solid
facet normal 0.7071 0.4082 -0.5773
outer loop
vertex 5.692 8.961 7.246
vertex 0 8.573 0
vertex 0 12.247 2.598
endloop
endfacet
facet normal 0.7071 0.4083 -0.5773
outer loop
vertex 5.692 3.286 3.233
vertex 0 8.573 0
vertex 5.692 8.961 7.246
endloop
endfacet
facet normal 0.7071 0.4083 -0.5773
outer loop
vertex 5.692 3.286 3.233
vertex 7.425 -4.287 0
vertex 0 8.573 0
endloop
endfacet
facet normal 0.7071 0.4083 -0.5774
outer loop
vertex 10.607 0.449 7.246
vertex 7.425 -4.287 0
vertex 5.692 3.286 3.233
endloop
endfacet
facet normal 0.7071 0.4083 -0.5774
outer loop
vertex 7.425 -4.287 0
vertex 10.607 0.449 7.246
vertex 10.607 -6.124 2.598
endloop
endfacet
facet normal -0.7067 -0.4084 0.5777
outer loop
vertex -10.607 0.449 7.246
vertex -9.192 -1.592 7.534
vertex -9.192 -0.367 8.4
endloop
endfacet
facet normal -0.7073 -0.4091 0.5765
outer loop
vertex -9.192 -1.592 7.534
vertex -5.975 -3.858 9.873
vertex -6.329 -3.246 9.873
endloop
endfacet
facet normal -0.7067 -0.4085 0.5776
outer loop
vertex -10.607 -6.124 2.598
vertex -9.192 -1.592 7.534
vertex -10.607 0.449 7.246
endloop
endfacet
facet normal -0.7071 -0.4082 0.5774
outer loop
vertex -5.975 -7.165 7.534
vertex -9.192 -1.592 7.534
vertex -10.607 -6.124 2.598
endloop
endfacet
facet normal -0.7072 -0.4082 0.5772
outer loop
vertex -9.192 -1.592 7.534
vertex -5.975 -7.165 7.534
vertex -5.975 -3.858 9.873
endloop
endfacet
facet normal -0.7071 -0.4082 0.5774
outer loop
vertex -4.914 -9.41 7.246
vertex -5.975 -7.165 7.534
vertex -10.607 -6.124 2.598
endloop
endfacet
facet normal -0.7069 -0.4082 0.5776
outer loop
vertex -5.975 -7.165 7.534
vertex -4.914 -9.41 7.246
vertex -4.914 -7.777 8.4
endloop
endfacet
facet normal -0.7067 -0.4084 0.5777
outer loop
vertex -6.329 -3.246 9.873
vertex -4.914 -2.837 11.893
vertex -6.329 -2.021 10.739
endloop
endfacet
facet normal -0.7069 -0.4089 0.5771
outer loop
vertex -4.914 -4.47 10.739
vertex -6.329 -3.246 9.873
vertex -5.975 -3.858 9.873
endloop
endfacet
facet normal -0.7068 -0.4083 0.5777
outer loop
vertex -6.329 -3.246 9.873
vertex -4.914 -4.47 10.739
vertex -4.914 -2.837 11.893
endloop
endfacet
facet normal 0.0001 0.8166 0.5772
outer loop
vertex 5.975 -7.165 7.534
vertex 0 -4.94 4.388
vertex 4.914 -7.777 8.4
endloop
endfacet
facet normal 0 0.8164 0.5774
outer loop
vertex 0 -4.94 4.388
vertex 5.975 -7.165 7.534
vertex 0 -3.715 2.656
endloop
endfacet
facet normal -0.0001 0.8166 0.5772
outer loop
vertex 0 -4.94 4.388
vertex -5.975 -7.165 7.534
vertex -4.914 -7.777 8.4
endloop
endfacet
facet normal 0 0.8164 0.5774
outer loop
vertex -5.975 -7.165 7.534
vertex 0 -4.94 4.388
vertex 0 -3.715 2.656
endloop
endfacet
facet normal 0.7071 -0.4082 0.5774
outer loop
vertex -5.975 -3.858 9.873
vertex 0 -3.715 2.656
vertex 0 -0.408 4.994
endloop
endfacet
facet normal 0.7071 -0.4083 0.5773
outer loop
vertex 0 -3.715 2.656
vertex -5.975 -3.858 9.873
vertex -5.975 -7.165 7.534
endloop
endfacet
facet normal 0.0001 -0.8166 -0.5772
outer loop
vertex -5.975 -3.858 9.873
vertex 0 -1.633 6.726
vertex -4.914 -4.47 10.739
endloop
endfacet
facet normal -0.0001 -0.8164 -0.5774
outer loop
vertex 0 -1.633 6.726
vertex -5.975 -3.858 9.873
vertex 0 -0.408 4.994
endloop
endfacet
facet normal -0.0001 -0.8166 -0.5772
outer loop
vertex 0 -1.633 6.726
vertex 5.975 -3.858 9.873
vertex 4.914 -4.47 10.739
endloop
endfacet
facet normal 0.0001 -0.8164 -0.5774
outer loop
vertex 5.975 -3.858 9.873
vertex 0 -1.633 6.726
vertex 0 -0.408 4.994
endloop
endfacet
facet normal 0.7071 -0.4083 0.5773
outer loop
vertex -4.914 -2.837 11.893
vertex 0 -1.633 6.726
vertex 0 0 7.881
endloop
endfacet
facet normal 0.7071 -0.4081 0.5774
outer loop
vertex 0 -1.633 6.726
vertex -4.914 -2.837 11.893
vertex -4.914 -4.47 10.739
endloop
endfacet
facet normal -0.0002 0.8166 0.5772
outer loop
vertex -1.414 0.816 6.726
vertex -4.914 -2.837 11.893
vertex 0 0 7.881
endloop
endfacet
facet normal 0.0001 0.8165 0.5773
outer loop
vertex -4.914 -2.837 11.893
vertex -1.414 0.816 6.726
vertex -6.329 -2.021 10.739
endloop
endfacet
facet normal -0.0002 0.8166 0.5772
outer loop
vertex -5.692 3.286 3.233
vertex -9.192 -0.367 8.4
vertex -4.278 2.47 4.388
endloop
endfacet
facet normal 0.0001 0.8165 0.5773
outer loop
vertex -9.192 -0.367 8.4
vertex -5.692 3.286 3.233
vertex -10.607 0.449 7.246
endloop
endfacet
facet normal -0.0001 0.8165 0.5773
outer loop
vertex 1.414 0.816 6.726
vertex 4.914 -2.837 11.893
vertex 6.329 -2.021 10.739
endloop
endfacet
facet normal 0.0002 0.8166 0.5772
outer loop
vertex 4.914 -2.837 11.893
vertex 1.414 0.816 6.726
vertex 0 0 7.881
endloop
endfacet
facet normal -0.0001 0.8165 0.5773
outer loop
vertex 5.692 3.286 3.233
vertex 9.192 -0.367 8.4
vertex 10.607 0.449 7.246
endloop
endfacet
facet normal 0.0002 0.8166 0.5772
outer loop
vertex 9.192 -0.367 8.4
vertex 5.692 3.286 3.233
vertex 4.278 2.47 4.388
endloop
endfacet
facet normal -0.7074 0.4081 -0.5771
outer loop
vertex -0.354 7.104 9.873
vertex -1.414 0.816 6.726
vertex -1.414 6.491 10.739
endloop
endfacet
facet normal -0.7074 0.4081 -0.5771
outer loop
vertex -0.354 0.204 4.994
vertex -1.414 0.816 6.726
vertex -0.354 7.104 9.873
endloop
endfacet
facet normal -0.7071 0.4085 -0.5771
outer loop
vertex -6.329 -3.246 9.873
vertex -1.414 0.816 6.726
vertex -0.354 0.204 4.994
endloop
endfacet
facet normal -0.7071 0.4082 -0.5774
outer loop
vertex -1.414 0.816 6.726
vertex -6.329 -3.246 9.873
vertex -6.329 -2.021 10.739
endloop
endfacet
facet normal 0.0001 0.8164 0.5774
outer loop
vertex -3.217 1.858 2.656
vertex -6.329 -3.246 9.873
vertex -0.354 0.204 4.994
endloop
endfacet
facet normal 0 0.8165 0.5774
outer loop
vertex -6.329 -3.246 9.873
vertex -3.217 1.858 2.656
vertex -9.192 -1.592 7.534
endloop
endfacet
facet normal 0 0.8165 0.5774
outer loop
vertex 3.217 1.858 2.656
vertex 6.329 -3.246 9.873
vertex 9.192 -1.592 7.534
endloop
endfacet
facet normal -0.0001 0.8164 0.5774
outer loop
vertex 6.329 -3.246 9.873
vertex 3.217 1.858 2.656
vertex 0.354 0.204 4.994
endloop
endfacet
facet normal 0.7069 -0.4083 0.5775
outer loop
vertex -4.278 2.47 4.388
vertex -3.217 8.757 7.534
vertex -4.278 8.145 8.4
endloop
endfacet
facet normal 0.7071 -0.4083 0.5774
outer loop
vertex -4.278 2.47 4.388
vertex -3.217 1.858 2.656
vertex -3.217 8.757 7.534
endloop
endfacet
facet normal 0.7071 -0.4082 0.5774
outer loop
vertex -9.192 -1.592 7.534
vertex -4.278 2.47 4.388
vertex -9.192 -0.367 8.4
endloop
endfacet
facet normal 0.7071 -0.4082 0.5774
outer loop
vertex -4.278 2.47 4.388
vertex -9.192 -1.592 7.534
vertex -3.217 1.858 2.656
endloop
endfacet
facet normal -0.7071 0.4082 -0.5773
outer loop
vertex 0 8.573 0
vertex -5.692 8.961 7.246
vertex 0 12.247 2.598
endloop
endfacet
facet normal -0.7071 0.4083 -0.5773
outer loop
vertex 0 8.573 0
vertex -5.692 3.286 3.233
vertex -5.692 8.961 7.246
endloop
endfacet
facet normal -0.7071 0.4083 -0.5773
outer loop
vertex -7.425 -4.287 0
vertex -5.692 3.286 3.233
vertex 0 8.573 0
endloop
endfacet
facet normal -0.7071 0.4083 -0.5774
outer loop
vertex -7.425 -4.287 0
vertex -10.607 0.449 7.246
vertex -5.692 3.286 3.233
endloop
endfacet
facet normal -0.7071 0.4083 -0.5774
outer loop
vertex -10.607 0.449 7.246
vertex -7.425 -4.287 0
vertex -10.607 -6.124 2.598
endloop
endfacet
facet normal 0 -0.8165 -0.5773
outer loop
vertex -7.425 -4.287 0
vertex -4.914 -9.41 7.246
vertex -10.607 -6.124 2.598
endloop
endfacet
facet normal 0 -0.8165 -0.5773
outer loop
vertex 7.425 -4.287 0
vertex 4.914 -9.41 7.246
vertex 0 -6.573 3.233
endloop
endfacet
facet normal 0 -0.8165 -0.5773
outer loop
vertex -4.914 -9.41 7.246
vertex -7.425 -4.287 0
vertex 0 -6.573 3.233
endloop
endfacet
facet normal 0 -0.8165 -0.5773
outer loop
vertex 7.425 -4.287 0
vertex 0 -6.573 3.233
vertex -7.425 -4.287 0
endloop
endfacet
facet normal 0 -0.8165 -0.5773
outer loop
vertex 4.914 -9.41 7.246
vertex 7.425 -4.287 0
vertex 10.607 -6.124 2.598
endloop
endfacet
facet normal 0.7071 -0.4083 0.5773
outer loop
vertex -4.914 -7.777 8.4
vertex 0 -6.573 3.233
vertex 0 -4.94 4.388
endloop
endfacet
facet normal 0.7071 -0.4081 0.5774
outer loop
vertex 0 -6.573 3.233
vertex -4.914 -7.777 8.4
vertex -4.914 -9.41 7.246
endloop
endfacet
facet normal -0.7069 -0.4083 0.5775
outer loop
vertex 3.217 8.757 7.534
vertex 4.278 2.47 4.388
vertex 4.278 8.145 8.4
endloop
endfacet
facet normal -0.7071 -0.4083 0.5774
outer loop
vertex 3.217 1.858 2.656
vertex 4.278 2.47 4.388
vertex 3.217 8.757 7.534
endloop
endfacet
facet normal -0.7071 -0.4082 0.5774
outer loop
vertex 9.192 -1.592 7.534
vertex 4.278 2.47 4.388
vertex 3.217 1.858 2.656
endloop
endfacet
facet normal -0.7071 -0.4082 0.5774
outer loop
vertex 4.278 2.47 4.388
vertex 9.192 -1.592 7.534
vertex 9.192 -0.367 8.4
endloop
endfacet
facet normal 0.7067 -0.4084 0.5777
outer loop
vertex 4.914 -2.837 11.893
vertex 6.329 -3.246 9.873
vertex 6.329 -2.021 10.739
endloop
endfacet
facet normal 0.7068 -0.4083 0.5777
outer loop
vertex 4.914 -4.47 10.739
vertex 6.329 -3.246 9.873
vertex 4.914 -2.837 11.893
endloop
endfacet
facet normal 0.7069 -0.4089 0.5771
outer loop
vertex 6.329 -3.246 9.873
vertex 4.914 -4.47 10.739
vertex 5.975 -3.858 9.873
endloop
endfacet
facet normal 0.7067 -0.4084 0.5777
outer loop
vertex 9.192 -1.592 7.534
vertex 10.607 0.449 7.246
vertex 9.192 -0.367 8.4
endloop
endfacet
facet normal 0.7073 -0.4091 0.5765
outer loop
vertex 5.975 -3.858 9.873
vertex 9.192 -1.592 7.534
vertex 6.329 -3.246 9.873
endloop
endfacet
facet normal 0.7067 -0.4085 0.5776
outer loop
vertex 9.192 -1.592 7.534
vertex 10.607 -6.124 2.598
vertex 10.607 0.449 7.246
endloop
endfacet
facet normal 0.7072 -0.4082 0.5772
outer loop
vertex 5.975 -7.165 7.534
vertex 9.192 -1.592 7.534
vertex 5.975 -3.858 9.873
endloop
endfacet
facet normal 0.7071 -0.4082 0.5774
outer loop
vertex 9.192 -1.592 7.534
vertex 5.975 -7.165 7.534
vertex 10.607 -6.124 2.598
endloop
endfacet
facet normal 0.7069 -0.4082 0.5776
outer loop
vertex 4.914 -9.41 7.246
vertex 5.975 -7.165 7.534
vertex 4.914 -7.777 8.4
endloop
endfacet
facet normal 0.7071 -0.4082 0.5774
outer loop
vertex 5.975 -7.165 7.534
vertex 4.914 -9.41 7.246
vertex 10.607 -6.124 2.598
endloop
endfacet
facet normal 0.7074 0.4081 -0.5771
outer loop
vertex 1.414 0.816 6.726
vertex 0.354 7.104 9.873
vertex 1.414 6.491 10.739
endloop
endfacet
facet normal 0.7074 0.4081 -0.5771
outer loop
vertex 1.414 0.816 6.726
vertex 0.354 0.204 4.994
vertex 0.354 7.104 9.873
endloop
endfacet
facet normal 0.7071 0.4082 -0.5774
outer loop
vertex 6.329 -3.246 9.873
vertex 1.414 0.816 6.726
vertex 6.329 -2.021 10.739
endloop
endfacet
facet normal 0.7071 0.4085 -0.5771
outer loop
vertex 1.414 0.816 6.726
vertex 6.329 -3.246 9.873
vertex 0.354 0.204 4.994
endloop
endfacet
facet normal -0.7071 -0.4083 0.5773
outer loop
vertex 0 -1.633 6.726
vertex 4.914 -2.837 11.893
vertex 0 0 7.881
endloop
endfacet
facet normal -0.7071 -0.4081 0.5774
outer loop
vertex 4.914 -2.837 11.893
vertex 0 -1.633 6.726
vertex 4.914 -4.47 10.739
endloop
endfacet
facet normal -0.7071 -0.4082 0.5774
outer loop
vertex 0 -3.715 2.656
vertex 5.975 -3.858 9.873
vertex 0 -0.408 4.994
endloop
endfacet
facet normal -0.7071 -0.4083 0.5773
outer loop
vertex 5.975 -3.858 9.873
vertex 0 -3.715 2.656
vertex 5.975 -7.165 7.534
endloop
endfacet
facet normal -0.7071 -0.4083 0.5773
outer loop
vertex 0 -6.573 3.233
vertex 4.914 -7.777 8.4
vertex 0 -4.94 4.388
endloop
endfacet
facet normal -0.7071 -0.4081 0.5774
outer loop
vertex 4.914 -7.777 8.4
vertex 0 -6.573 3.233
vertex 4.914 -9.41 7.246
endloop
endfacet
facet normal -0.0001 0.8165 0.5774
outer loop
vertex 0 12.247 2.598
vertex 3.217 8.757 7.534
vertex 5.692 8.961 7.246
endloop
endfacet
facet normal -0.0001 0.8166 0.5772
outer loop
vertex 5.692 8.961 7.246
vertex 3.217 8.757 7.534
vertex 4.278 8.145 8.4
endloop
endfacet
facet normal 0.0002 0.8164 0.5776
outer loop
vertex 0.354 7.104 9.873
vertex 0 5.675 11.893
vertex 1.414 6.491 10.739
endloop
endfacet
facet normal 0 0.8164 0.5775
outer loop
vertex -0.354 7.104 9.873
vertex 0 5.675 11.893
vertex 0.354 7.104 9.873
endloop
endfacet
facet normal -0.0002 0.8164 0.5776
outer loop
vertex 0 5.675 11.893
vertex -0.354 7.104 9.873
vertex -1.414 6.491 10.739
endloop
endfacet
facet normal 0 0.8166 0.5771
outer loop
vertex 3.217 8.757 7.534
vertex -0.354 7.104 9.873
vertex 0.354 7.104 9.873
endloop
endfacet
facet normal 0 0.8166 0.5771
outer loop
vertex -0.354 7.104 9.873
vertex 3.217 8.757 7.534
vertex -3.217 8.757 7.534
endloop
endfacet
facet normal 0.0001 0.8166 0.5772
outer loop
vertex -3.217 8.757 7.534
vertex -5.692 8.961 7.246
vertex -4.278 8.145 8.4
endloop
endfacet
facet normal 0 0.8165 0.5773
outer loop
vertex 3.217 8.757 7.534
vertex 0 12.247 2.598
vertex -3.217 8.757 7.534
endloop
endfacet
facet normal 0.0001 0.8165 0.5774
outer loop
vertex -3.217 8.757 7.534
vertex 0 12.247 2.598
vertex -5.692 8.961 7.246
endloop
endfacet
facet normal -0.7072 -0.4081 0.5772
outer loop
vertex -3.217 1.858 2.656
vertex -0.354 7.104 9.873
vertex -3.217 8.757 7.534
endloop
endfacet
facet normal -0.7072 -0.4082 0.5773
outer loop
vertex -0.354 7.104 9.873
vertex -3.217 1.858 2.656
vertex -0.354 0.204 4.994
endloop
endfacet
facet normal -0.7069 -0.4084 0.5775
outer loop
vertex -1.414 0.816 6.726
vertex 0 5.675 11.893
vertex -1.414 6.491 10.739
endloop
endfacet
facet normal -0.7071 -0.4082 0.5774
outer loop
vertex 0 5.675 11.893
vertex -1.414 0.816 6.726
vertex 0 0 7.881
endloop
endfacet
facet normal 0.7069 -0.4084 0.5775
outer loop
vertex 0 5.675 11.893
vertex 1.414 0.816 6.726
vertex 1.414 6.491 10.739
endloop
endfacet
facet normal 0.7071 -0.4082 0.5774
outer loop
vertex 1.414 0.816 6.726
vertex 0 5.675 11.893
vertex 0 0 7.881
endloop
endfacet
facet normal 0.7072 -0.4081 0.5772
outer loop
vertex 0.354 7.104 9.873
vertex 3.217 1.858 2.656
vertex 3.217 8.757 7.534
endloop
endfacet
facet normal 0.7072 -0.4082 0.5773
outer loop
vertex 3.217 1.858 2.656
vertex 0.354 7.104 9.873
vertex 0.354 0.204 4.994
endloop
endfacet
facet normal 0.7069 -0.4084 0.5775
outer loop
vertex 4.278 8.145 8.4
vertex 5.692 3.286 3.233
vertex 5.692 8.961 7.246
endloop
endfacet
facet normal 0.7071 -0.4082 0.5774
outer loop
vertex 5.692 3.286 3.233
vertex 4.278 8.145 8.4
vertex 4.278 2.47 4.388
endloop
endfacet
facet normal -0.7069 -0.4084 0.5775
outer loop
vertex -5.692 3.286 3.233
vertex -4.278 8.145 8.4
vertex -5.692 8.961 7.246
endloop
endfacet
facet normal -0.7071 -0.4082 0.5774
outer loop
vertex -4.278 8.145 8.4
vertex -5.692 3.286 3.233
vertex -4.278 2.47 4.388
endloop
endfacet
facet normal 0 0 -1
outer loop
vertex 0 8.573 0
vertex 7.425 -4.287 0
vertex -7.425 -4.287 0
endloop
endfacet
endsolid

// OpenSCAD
glassThickness = 4.05;
glassSpacer = 0.5;
wallThickness = 2;
mountLength = 15;

rotatedCornerProfile();

module profile()
{
    difference()
    {
        square(mountLength + wallThickness);
        translate([wallThickness + glassThickness + glassSpacer, wallThickness, 0])
        {
            square([mountLength, glassThickness]);
        }
        translate([wallThickness, wallThickness + glassThickness + glassSpacer, 0])
        {
            square([glassThickness, mountLength]);
        }
        translate([2 * wallThickness + glassThickness, 2 * wallThickness + glassThickness + glassSpacer, 0])
        {
            square([mountLength, mountLength]);
        }
        translate([2 * wallThickness + glassThickness, 0, 0])
        {
            square([mountLength, mountLength]);
        }
        translate([0, 2 * wallThickness + glassThickness, 0])
        {
            square([mountLength, mountLength]);
        }
    }
}

module profileExtrude()
{
    difference()
    {
        linear_extrude(height = mountLength)
        {
            profile();
        }
        translate([wallThickness + glassThickness, wallThickness + glassThickness, wallThickness])
        {
            cube([mountLength, mountLength, glassThickness]);
        }
    }
}

module cornerProfile()
{
    difference()
    {
        union()
        {
            profileExtrude();
            rotate([0, 90, 0])
            {
                rotate([0, 0, 90])
                {
                    profileExtrude();
                }
            }
            rotate([-90, 0, 0])
            {
                rotate([0, 0, -90])
                {
                    profileExtrude();
                }
            }
        }
    }
}

module rotatedCornerProfile()
{
    cutOff = 2 * wallThickness + glassSpacer + 6;
    translate([0, 0, -cutOff / sqrt(3)])
    {
        rotate([atan(1/sqrt(2)), 0, 0])
        {
            rotate([0, -45, 0])
            {
                difference()
                {
                    cornerProfile();
                    polyhedron( points  =   [   [-0.1, -0.1, -0.1],
                                                [cutOff, 0, 0],
                                                [0, cutOff, 0],
                                                [0, 0, cutOff],
                                            ],
                                faces   =   [   [0, 1, 2],
                                                [1, 3, 2],
                                                [2, 3, 0],
                                                [3, 1, 0],
                                            ]
                                );
                }
            }
        }
    }
}
